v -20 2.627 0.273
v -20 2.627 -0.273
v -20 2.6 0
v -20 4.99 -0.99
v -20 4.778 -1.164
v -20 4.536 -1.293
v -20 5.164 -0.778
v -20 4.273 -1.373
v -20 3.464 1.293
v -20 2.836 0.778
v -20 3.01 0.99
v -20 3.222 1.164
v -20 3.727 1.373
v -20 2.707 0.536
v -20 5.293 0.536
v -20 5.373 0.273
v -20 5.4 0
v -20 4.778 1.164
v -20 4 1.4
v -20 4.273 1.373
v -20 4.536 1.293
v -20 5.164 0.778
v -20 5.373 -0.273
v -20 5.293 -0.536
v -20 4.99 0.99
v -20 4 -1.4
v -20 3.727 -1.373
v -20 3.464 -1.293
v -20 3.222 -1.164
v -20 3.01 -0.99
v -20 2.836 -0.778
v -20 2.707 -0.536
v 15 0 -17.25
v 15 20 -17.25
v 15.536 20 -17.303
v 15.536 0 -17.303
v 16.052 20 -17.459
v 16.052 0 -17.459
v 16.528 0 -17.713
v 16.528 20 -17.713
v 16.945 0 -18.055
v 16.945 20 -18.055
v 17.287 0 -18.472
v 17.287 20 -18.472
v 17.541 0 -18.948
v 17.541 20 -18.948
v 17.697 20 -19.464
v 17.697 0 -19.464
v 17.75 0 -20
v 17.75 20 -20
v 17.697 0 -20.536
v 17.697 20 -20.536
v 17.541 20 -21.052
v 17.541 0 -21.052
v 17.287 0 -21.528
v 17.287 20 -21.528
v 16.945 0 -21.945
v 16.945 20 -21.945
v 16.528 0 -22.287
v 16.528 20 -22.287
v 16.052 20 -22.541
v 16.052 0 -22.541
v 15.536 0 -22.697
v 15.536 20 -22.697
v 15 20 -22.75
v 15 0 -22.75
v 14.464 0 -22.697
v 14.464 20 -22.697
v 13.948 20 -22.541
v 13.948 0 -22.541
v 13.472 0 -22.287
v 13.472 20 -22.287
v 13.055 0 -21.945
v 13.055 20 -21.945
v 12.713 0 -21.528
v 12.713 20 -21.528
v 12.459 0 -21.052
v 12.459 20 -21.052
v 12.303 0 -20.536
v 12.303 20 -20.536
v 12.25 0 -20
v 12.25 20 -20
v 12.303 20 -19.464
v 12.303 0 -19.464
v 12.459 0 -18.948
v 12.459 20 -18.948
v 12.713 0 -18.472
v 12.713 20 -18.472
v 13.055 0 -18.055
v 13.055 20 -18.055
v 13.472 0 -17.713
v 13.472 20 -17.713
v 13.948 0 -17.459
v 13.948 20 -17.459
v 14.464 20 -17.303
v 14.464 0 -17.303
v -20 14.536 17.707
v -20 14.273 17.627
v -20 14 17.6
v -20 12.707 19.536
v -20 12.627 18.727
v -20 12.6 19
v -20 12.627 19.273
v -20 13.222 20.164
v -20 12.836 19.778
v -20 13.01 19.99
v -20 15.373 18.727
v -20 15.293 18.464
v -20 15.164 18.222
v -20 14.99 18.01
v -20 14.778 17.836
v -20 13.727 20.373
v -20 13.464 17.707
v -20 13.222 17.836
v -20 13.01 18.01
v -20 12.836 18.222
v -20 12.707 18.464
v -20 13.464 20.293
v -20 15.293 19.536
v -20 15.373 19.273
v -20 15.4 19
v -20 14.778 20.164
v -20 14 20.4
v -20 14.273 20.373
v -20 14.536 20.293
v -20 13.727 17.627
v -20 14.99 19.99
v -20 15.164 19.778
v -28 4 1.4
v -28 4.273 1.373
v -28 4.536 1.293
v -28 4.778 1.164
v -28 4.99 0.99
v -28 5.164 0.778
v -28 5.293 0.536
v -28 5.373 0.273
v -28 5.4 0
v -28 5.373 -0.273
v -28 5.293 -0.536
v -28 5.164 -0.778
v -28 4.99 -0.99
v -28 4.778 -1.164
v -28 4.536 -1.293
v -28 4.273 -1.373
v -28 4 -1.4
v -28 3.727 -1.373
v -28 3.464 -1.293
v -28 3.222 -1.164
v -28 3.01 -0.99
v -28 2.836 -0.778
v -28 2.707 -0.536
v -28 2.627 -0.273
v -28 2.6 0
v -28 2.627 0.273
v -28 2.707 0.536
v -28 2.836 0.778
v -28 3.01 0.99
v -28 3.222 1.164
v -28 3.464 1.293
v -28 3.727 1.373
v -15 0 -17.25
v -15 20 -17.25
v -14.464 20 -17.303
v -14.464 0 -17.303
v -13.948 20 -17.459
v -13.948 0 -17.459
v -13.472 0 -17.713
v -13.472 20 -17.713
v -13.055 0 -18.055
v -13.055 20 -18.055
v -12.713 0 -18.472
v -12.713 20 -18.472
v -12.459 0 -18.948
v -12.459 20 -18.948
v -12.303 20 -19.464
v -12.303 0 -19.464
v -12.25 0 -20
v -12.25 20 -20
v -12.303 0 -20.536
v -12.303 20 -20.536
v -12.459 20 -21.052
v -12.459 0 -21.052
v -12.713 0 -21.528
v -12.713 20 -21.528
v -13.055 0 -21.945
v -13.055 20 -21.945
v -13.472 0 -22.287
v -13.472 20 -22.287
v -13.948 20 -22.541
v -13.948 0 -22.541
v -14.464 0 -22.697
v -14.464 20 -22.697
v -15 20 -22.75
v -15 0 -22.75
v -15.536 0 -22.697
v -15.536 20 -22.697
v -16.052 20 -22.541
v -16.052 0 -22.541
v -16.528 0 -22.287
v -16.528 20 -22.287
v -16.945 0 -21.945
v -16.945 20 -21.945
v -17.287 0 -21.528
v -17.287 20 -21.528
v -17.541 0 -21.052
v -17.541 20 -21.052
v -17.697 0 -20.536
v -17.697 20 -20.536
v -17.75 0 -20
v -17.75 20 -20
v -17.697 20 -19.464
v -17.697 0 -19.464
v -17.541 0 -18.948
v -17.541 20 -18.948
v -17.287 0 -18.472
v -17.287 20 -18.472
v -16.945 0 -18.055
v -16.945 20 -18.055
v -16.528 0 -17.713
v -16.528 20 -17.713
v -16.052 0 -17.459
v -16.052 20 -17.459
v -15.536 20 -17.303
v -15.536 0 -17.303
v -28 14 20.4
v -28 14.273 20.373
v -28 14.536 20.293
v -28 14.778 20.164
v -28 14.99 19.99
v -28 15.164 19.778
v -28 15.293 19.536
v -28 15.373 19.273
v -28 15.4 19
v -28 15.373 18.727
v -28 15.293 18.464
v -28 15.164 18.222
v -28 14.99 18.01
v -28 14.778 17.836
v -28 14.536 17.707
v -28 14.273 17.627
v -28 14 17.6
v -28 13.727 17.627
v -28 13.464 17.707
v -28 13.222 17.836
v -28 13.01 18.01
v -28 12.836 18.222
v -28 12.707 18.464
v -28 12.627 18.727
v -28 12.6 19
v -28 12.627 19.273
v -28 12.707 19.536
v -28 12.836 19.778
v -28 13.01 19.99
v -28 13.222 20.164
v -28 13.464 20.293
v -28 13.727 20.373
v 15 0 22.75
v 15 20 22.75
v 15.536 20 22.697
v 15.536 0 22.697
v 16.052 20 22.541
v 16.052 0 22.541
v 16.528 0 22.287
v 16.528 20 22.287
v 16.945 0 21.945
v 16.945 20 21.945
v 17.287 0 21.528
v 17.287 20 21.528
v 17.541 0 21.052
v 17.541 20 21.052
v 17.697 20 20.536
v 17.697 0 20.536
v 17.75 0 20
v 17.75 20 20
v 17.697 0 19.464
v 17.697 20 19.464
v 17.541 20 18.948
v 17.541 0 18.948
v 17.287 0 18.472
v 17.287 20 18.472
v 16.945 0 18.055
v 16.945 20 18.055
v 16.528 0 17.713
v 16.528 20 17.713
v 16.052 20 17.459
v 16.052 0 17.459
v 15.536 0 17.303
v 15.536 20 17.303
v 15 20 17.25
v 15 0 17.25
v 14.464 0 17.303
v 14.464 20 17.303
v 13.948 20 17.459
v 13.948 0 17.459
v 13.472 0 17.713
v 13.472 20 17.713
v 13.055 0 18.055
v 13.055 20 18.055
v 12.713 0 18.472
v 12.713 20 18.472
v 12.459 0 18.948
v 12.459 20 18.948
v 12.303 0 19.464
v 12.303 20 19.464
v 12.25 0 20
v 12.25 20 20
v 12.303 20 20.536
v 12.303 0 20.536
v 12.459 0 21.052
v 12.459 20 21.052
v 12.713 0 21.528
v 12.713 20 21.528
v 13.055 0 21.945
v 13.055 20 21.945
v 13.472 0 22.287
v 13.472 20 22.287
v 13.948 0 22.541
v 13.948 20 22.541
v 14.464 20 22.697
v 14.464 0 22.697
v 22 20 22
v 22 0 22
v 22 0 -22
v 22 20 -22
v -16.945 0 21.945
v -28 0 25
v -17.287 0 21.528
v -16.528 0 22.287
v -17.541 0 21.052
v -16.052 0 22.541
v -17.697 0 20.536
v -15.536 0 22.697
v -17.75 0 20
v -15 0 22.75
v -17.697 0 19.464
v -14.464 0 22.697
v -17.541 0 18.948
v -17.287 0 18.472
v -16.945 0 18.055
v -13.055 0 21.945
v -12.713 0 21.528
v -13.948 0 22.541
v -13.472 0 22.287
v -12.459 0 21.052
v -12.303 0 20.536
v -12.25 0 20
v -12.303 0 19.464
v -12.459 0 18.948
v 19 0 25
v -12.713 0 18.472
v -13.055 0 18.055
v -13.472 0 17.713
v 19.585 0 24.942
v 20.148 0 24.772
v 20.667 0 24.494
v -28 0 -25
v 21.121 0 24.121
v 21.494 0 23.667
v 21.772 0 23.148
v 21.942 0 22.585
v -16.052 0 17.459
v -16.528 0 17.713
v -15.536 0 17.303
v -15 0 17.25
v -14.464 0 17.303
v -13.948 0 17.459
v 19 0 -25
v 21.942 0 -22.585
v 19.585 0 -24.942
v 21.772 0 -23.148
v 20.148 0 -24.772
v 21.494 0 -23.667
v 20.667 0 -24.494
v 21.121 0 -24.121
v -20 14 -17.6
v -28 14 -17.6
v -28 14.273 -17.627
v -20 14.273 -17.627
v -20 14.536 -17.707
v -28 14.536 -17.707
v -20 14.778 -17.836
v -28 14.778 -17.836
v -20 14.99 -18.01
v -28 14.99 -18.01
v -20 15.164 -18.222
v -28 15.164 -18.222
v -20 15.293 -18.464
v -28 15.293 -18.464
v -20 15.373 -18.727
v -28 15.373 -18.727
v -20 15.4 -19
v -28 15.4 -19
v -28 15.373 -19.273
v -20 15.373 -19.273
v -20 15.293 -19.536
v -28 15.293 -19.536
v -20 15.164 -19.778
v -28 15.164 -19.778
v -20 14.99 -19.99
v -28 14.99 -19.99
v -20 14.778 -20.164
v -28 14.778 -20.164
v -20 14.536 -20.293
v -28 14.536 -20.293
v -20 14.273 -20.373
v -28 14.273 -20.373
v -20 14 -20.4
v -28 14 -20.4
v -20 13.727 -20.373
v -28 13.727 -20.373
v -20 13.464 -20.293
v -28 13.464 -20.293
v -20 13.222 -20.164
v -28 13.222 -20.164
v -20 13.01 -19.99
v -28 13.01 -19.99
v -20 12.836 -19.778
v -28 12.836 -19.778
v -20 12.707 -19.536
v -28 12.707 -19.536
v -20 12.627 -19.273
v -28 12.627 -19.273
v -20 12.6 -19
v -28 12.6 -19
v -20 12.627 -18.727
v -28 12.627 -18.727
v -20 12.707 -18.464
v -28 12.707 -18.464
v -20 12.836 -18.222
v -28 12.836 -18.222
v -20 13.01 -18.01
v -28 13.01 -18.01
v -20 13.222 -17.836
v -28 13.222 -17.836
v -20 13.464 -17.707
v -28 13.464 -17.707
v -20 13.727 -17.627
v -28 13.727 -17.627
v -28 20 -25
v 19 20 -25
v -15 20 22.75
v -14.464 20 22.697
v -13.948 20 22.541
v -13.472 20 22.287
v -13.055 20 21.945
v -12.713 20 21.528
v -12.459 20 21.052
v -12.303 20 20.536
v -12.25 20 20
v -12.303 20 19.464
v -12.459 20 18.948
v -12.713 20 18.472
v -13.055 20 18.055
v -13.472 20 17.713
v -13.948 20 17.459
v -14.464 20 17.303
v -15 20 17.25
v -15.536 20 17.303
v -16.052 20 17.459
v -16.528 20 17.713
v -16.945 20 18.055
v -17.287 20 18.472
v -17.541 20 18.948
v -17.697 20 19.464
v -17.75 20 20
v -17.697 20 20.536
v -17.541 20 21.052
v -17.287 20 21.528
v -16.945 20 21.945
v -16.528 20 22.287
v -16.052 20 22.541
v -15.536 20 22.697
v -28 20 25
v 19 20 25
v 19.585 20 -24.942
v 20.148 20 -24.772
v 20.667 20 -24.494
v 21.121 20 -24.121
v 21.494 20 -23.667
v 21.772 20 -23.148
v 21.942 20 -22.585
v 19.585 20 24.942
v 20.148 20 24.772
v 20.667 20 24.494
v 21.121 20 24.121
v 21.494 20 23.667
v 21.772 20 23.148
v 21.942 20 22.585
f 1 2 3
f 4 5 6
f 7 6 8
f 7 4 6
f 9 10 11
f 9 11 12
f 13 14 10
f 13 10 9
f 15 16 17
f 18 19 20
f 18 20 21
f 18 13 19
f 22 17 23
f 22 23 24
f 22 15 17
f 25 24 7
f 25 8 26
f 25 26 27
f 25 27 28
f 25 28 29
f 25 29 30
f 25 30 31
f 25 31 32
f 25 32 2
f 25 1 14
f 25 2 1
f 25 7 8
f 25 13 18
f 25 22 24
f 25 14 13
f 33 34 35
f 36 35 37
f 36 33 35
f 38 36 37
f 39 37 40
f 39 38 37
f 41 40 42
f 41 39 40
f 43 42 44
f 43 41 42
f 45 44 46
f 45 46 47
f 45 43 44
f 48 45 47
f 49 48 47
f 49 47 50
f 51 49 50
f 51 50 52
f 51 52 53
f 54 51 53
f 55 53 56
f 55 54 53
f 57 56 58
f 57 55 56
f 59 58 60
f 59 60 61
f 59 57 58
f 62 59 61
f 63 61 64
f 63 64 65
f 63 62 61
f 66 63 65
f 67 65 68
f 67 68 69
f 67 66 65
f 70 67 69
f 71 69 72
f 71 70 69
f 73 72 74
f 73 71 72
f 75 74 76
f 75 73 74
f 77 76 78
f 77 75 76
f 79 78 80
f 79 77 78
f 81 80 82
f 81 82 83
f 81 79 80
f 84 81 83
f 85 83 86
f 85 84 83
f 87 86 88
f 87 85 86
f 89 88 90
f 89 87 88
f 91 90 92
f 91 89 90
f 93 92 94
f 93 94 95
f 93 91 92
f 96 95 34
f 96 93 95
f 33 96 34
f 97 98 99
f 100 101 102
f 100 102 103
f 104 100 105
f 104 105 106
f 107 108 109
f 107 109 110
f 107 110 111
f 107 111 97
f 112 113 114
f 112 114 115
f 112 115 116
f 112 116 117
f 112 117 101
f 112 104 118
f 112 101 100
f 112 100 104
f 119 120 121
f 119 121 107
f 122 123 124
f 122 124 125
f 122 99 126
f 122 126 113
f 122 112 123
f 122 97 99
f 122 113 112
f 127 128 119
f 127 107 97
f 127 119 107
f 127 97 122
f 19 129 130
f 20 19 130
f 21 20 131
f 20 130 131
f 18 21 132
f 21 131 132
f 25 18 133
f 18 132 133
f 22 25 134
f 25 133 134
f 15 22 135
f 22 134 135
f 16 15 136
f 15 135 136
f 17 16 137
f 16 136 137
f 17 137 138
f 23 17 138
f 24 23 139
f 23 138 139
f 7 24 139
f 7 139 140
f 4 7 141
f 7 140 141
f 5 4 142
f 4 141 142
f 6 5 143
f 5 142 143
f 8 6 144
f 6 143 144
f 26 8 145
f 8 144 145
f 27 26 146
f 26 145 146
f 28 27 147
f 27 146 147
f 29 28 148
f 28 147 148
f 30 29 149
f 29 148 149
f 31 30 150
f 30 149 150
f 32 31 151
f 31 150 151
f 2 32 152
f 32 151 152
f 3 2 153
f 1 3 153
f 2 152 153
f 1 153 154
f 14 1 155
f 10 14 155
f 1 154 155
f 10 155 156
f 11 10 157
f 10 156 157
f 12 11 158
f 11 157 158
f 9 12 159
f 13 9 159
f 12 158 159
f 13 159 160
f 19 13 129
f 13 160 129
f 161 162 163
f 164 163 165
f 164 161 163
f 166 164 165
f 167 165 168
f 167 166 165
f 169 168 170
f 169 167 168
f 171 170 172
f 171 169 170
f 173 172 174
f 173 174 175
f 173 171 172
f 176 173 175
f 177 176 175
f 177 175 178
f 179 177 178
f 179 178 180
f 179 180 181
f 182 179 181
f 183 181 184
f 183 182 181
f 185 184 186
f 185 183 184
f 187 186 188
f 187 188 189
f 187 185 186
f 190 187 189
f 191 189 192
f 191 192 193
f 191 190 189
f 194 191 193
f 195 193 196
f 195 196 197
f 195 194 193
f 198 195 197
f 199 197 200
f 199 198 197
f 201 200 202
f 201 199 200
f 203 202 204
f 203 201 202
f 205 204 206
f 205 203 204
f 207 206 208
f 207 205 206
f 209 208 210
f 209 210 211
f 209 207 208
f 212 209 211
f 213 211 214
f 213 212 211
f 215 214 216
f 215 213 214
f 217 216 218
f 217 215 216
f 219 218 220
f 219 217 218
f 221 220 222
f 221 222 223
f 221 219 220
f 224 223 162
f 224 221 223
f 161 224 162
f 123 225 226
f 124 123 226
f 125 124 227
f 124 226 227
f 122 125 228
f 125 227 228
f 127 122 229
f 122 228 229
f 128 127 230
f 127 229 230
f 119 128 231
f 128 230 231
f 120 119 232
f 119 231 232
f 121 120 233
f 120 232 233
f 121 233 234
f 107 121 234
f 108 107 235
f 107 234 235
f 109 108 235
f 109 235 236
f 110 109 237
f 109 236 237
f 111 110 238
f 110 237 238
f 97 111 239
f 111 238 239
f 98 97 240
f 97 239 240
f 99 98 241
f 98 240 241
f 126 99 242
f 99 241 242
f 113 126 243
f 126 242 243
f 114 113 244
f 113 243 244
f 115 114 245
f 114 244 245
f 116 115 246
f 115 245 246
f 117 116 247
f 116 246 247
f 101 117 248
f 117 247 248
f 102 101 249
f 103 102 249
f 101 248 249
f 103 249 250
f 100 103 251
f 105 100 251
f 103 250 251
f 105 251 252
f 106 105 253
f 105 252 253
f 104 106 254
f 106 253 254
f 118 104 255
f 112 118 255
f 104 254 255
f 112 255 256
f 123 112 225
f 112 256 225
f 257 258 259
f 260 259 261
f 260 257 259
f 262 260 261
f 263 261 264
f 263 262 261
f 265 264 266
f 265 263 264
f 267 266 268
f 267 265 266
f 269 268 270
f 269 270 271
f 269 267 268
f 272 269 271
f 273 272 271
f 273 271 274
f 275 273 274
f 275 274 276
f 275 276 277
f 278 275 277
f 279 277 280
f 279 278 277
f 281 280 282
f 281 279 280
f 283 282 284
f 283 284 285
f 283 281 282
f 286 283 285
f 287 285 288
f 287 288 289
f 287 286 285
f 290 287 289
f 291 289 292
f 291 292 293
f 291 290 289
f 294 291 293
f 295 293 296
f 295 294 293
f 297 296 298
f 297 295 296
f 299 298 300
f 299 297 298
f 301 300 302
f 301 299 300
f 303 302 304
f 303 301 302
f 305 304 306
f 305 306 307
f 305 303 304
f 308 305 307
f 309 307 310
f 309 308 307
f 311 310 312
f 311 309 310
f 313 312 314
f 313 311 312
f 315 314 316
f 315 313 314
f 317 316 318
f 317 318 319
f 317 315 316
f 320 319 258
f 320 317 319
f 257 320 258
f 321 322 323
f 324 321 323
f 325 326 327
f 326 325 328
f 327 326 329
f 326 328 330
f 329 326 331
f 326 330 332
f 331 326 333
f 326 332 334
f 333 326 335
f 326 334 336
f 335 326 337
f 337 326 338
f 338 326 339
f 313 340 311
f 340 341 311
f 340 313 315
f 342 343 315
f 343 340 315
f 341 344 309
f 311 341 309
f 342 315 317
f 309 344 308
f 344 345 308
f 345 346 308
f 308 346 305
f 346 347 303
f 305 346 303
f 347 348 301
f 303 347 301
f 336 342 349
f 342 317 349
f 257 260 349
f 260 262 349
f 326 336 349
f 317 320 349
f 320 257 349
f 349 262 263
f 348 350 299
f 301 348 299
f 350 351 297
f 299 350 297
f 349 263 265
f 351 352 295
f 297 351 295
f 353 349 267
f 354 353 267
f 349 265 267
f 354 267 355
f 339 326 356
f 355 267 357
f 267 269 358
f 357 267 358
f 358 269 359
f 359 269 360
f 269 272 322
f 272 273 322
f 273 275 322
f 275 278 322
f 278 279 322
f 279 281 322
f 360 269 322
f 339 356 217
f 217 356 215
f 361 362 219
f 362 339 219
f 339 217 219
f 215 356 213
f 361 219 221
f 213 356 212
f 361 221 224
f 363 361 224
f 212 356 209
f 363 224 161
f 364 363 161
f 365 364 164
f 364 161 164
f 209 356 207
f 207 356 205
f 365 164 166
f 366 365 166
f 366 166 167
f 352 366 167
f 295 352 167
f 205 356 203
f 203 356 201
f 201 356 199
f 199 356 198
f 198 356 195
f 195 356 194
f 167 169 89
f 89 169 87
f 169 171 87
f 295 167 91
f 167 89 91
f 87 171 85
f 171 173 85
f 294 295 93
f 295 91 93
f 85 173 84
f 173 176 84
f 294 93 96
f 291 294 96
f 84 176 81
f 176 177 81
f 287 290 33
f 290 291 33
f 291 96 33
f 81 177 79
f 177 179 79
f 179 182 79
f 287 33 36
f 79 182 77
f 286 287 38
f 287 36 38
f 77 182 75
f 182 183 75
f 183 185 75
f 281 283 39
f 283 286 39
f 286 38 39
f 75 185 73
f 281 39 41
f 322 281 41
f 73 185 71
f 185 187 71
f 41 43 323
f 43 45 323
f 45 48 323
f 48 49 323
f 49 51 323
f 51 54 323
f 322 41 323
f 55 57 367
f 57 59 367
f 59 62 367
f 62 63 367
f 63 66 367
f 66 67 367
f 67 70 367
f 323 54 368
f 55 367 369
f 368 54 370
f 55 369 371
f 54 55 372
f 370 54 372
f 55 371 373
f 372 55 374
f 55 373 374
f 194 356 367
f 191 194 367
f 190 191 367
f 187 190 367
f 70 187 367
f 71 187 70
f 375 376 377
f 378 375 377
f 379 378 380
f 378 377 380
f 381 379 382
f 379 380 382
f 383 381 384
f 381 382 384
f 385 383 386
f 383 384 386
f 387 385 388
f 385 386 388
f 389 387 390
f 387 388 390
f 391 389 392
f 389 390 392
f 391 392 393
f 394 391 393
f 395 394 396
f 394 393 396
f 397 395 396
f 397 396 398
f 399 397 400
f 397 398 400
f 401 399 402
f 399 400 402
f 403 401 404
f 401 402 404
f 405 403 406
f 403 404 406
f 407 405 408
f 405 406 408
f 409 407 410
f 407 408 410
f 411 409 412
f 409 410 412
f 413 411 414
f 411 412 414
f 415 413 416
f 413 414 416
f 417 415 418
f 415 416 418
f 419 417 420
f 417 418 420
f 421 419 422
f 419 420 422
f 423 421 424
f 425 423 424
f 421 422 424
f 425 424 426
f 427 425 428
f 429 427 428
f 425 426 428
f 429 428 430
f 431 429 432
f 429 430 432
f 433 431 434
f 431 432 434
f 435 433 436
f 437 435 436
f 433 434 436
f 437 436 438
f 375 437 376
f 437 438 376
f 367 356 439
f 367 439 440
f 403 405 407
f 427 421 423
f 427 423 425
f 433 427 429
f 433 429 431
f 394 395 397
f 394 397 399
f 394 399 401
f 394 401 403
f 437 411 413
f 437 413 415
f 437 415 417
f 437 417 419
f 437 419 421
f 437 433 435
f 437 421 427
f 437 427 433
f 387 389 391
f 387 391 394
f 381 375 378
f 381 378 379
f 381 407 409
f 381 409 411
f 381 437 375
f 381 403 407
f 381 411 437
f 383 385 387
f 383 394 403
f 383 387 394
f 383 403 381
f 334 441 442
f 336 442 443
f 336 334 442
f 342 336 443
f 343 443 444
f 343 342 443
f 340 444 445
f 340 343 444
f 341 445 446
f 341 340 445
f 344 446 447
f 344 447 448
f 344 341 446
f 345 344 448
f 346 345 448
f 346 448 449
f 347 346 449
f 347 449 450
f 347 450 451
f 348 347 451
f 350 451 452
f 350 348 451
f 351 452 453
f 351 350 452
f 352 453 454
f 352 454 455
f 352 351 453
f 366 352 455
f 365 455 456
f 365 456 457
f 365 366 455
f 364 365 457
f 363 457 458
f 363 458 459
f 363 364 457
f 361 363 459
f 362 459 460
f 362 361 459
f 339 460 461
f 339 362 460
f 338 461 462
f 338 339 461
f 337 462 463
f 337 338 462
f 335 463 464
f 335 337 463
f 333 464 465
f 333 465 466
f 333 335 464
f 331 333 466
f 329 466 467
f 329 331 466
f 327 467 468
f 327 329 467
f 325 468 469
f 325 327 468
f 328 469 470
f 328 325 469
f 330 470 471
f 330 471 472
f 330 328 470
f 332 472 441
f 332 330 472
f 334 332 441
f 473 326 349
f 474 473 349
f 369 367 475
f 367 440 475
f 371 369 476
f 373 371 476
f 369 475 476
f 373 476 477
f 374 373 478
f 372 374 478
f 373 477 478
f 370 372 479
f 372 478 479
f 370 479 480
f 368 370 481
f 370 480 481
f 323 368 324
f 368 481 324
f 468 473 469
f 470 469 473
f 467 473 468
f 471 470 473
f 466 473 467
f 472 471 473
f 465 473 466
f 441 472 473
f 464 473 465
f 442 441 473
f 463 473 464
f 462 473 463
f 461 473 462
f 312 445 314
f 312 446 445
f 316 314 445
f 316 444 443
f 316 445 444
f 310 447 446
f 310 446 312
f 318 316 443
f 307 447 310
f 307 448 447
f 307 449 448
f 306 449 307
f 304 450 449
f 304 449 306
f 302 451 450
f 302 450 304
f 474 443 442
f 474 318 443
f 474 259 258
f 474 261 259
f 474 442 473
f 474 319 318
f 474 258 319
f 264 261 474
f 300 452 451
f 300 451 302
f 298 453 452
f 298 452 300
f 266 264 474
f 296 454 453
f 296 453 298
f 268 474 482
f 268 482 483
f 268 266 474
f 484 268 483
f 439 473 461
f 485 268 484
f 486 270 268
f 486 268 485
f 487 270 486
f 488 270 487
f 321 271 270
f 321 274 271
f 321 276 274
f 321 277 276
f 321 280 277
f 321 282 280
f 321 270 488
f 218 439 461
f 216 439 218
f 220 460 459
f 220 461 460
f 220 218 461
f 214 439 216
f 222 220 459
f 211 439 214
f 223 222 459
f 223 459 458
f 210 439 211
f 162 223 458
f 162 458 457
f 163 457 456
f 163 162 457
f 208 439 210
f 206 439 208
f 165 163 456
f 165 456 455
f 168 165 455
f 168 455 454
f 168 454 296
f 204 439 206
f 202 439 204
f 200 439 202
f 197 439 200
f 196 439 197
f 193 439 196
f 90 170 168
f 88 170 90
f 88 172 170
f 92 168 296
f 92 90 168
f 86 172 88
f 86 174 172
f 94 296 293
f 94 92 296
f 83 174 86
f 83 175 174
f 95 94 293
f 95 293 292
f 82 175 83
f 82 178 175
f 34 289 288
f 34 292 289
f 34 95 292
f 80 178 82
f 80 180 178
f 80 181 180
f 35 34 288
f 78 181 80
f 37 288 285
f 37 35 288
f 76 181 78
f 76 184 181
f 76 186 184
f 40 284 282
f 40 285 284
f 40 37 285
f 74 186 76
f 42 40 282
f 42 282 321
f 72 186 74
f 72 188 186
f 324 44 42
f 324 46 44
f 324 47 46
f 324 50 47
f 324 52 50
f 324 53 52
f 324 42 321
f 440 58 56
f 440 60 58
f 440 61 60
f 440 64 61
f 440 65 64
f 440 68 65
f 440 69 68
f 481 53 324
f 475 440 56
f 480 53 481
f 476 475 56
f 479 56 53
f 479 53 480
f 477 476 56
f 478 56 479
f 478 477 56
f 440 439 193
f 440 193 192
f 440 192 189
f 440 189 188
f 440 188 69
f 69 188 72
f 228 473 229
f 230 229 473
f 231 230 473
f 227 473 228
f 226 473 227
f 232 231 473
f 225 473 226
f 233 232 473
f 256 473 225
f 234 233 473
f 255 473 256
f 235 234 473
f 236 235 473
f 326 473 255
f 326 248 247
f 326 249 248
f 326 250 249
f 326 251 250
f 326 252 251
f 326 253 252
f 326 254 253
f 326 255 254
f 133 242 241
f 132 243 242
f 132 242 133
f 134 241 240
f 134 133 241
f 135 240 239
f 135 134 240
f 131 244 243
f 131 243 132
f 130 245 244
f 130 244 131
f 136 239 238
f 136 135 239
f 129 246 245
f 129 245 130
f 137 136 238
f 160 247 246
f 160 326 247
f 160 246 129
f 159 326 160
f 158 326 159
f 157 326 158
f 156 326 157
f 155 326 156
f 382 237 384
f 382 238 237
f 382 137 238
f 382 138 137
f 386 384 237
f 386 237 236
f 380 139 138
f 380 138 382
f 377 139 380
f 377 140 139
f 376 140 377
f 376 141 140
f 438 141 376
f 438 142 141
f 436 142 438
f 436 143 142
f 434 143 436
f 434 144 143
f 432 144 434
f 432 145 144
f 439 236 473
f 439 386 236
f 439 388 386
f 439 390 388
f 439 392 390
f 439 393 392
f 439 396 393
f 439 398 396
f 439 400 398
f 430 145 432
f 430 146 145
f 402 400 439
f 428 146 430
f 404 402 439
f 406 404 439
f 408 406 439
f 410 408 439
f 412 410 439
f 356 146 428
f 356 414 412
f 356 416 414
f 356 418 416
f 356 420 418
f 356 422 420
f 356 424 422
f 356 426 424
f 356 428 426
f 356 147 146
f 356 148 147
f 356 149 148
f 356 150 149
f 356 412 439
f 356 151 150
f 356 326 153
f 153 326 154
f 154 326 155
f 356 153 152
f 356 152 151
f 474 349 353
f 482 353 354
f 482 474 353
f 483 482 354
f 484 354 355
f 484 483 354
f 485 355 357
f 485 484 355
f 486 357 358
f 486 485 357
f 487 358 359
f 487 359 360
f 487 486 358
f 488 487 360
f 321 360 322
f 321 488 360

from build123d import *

# Parameters (mm, degrees)
SKETCH1_W           = 50
SKETCH1_H           = 50
SKETCH1_R           = 2.75
BOSS_EXTRUDE1_DEPTH = 20
FILLET1_R           = 3
SKETCH2_R           = 1.4
CUT_EXTRUDE1_DEPTH  = 8


with BuildPart() as part:
    # Sketch1 → Boss-Extrude1 (new body)
    with BuildSketch(Plane(origin=(0, 0, 0), x_dir=(1, 0, 0), z_dir=(0, 1, 0))):
        with Locations((-3, 0)):
            Rectangle(SKETCH1_W, SKETCH1_H)
        with Locations((-15, 20)):
            Circle(SKETCH1_R, mode=Mode.SUBTRACT)
        with Locations((15, 20)):
            Circle(SKETCH1_R, mode=Mode.SUBTRACT)
        with Locations((-15, -20)):
            Circle(SKETCH1_R, mode=Mode.SUBTRACT)
        with Locations((15, -20)):
            Circle(SKETCH1_R, mode=Mode.SUBTRACT)
    extrude(amount=BOSS_EXTRUDE1_DEPTH)

    # Fillet1
    fillet1_edges = [part.edges().sort_by_distance(p)[0] for p in [
        (22, 10, -25),
        (22, 10, 25),
    ]]
    fillet(fillet1_edges, radius=FILLET1_R)

    # Sketch2 → Cut-Extrude1 (cut)
    with BuildSketch(Plane.ZY.offset(28)):
        with Locations((-19, 14)):
            Circle(SKETCH2_R)
        with Locations((0, 4)):
            Circle(SKETCH2_R)
        with Locations((19, 14)):
            Circle(SKETCH2_R)
    extrude(amount=-CUT_EXTRUDE1_DEPTH, mode=Mode.SUBTRACT)


solid = part.part
